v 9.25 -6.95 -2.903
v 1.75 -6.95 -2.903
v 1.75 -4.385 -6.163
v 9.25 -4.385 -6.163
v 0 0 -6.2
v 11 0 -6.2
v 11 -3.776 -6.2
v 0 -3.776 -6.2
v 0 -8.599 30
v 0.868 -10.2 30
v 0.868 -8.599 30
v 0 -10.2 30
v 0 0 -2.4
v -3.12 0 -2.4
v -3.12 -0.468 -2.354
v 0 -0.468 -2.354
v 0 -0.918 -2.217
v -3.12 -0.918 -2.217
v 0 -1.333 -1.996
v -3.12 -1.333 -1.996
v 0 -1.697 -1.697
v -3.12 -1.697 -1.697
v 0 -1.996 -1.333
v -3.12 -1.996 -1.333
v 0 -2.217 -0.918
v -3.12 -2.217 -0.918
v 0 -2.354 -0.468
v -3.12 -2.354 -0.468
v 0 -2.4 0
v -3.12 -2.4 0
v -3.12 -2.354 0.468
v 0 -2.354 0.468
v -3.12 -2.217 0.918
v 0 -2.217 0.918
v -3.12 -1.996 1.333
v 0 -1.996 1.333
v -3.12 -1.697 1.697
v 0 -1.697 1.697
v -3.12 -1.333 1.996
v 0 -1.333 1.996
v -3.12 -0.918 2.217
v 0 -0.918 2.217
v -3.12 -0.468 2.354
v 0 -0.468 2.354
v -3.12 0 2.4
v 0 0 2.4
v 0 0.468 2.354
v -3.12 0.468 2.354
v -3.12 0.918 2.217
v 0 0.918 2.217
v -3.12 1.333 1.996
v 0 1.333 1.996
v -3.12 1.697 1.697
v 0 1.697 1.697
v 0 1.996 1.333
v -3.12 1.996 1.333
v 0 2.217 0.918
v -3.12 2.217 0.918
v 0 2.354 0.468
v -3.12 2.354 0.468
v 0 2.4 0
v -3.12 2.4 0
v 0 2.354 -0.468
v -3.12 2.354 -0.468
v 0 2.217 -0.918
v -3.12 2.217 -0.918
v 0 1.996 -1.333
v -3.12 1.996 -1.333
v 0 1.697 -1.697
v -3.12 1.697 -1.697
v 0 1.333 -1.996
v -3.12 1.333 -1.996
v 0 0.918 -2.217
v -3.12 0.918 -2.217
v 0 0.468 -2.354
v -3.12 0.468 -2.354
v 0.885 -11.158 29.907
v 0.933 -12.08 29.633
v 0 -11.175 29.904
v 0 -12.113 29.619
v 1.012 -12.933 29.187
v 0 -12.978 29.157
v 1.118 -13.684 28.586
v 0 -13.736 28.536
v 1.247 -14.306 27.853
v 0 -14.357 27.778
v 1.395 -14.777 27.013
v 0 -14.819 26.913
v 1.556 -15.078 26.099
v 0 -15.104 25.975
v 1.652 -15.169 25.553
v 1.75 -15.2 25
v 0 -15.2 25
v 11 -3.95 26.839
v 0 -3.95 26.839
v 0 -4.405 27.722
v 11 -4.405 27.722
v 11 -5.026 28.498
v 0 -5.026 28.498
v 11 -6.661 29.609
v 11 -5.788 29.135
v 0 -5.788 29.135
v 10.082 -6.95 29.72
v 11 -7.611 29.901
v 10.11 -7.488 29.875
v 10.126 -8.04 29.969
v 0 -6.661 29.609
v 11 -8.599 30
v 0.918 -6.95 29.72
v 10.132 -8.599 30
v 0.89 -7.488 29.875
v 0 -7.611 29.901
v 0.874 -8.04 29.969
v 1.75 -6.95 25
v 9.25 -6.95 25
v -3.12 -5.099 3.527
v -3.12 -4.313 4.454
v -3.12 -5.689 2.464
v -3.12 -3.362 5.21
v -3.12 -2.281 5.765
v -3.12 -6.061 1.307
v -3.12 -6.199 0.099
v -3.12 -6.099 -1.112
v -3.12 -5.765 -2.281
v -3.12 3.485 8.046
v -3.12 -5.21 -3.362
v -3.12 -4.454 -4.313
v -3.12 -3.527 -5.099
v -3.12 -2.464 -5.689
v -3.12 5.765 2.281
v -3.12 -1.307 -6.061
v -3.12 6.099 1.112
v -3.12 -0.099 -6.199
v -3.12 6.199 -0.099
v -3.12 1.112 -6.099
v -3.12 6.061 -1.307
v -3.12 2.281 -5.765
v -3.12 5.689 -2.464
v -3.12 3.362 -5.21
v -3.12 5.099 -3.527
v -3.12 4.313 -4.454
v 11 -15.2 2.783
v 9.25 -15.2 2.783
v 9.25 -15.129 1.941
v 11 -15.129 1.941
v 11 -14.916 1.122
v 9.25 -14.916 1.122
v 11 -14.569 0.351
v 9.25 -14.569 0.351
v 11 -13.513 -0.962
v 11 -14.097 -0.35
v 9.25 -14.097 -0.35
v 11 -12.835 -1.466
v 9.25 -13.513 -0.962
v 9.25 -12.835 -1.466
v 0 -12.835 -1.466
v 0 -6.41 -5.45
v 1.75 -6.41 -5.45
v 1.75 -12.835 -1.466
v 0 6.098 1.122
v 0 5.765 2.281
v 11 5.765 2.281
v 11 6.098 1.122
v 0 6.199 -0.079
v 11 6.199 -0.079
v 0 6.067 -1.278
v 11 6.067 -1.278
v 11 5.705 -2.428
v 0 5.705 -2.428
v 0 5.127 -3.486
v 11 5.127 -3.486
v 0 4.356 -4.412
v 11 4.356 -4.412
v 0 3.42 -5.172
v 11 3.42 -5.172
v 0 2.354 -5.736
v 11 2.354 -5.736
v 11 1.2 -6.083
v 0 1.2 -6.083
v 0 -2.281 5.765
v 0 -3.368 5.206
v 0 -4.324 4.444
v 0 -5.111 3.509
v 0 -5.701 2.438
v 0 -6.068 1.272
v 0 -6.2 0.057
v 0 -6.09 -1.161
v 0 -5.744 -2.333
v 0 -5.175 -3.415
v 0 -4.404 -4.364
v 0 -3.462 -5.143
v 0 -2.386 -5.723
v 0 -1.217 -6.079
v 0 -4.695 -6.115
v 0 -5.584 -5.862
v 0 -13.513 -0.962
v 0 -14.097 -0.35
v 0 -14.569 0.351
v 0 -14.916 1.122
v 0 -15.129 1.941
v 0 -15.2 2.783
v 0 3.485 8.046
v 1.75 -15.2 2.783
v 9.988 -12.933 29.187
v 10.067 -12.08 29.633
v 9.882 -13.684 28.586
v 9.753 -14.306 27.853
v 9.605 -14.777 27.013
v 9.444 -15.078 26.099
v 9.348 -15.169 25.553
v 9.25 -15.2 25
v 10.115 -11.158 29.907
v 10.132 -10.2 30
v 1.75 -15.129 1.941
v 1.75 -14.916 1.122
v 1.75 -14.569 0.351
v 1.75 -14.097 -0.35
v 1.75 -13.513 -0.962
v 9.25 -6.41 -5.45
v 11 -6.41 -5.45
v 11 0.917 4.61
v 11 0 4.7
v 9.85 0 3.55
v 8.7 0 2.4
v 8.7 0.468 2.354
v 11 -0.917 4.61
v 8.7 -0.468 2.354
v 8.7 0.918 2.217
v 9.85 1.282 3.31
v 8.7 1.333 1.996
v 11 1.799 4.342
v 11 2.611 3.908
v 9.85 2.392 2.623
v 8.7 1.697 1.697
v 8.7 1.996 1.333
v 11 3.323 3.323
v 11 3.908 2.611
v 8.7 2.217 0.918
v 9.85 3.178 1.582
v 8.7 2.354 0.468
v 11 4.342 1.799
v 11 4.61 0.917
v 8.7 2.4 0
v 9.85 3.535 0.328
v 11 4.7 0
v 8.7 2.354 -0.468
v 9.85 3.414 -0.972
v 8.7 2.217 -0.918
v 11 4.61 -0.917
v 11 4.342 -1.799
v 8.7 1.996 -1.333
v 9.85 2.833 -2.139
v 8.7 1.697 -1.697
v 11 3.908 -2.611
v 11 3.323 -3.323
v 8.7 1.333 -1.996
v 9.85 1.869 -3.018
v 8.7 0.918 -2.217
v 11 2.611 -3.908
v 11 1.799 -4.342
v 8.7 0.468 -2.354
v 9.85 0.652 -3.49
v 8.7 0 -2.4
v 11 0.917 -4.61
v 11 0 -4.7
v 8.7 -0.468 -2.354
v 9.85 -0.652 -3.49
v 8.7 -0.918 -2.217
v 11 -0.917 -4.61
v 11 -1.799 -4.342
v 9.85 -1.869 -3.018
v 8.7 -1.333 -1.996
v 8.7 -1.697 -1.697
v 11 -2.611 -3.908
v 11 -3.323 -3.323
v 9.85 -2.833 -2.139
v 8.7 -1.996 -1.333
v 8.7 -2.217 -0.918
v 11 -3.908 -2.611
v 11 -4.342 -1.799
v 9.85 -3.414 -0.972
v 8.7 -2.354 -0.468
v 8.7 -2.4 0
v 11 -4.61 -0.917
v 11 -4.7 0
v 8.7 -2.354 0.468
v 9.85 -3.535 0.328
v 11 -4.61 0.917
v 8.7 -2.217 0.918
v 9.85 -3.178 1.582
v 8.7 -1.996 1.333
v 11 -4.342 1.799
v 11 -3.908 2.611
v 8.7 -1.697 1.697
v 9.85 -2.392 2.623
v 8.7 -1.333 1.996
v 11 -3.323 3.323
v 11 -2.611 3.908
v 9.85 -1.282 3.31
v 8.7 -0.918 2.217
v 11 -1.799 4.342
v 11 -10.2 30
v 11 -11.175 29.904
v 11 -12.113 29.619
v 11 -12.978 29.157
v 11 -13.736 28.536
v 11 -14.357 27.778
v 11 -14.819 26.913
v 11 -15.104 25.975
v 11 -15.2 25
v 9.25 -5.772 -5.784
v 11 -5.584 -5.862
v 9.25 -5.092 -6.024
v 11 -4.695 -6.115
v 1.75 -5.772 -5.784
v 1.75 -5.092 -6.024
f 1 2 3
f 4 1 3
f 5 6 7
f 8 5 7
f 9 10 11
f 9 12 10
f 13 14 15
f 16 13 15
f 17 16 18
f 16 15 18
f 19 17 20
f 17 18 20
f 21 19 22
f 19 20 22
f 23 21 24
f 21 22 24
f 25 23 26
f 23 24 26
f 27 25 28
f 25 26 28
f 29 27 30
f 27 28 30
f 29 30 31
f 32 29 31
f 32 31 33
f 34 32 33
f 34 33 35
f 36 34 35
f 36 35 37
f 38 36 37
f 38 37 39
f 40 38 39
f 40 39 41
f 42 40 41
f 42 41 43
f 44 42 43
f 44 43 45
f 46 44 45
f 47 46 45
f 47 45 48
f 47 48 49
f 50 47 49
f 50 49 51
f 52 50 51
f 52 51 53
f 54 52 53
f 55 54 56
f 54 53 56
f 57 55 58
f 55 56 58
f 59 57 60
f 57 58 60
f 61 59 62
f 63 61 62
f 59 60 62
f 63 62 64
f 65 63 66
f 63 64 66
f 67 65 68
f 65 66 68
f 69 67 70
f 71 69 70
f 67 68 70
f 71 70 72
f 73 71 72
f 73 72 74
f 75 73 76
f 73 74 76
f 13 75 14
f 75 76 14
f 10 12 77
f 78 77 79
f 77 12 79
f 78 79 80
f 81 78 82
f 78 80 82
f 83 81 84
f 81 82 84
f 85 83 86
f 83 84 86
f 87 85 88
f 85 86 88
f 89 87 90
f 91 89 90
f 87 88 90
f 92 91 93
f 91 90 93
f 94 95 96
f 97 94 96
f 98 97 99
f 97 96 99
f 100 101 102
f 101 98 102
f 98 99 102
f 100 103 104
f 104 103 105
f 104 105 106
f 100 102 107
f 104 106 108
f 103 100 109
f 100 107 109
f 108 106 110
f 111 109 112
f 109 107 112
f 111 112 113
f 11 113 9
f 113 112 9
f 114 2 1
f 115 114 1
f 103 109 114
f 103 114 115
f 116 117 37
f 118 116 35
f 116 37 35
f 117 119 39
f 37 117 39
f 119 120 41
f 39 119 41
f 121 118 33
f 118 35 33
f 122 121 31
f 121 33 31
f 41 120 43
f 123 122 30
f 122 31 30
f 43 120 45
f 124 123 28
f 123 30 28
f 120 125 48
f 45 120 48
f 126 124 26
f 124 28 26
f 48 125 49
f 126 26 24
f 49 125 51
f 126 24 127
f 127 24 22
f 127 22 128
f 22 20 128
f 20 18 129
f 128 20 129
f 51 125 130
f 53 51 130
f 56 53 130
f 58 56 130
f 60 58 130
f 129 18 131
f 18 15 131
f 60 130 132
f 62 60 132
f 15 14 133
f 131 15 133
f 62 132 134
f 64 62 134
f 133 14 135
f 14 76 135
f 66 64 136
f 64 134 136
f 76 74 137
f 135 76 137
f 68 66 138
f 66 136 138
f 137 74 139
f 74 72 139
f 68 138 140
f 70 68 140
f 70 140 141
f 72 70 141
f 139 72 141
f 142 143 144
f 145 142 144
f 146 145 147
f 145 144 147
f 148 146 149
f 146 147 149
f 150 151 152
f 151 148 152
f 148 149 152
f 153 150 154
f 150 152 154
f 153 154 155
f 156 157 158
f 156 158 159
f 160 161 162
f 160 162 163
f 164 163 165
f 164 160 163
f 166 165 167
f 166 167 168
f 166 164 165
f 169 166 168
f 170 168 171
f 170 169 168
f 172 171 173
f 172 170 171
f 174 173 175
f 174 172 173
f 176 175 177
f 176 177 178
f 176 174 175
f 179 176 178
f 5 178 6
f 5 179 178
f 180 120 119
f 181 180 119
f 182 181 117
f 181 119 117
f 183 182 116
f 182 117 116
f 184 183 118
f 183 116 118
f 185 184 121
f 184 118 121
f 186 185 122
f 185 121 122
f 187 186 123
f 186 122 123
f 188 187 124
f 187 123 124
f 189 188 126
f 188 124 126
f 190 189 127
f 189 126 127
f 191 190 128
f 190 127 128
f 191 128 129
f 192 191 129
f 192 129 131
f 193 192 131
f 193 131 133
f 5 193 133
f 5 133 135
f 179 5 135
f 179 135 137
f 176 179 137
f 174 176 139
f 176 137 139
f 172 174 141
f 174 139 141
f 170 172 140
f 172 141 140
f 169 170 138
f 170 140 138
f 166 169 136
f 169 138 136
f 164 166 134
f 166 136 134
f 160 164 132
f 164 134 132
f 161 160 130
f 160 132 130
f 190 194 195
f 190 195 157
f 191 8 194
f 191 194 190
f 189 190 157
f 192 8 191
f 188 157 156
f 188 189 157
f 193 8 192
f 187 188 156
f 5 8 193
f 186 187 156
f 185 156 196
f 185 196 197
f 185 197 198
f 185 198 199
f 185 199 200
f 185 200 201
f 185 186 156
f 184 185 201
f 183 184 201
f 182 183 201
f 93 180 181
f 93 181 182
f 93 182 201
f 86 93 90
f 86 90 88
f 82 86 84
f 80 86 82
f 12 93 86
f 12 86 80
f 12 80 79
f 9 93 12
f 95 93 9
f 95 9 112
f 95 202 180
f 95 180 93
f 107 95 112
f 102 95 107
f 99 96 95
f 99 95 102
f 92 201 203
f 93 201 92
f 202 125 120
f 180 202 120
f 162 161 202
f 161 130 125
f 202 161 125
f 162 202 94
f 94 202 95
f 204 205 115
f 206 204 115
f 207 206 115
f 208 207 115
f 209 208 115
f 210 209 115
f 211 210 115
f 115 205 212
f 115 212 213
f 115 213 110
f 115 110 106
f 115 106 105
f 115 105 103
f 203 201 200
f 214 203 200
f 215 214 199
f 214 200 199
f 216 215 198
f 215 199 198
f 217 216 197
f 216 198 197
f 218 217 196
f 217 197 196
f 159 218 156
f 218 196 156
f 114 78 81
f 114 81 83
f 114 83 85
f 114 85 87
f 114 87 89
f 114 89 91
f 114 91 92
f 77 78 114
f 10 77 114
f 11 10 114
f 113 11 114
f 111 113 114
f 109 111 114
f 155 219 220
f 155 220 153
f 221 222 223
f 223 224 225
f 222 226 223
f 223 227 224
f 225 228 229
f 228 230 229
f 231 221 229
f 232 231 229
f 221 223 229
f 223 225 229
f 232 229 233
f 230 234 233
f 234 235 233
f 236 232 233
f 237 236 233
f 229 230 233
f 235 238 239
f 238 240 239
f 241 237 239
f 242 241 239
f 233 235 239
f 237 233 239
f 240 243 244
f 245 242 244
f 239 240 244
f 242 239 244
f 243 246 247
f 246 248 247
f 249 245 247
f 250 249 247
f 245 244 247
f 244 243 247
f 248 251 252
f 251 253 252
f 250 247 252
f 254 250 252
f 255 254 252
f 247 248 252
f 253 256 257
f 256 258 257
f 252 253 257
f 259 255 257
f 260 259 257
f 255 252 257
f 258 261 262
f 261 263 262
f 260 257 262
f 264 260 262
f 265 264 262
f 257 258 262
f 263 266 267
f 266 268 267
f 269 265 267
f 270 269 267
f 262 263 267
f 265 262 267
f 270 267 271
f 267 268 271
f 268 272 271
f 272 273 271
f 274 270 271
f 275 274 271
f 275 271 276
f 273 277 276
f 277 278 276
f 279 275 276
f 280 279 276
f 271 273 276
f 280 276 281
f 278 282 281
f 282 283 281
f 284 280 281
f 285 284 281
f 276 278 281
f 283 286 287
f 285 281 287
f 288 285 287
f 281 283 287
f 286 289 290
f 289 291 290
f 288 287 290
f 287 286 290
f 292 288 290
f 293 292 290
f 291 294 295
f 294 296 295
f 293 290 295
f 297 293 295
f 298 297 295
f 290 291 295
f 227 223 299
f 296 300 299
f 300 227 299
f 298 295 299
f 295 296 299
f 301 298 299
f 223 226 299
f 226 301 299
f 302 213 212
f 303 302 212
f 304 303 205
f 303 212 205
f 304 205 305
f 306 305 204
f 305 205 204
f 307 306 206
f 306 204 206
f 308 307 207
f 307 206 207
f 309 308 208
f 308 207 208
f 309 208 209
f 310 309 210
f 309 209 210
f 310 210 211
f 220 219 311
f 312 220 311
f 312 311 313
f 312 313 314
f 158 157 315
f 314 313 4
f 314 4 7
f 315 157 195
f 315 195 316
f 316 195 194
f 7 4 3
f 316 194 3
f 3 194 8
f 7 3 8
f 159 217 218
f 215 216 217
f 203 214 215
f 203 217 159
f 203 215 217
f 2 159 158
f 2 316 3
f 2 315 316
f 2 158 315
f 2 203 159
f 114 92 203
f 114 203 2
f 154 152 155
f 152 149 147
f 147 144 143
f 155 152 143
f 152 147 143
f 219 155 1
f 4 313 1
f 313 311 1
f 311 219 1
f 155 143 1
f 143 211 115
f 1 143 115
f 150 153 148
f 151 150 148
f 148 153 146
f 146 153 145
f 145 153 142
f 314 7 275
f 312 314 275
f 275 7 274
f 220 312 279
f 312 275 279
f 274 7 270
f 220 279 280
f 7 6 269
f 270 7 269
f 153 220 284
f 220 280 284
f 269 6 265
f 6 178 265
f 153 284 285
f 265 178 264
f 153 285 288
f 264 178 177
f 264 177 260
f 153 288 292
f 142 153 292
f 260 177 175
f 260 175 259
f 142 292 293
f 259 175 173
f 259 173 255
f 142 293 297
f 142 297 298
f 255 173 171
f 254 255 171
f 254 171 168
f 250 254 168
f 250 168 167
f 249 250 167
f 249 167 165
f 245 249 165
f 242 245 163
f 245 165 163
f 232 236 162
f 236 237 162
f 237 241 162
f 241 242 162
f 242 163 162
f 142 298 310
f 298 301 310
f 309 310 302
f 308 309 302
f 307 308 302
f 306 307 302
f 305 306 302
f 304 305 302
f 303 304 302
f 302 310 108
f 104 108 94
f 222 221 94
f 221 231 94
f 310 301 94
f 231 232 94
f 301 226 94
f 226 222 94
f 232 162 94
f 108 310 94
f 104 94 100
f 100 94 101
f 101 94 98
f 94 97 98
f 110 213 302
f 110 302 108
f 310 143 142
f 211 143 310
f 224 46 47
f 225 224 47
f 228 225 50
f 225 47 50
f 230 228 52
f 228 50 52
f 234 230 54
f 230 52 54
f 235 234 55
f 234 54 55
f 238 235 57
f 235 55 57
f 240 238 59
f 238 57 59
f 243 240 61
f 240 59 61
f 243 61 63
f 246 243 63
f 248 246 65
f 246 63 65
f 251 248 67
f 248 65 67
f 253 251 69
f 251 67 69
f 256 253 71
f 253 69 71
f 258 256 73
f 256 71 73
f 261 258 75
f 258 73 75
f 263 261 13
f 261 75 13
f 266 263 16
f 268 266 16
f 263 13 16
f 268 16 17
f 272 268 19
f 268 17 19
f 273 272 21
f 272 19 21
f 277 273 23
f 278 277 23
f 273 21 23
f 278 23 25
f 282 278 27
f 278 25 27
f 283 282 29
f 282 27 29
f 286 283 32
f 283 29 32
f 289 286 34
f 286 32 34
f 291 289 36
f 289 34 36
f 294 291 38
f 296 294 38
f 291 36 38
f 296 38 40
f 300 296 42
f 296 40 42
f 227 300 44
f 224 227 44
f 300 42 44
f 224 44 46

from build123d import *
from OCP.BRepFilletAPI import BRepFilletAPI_MakeChamfer

# Parameters (mm, degrees)
SKETCH1_R                                       = 2.2
BOSS_EXTRUDE1_DEPTH                             = 11
CUT_EXTRUDE1_REACH                              = 42.774
SKETCH2_W                                       = 7.5
SKETCH2_H                                       = 8.25
CHAMFER3_SIZE                                   = 5
CHAMFER3_SIZE2                                  = 0.881634904
FILLET1_R                                       = 5
CHAMFER1_SIZE                                   = 2.212207332
CHAMFER1_SIZE_2                                 = 4
CSK_FOR_M4_FLAT_HEAD_MACHINE_SCREW1_D           = 4.8
CSK_FOR_M4_FLAT_HEAD_MACHINE_SCREW1_CSINK_D     = 9.4
CSK_FOR_M4_FLAT_HEAD_MACHINE_SCREW1_CSINK_ANGLE = 90
BOSS_EXTRUDE2_START                             = 3.12
SKETCH6_R                                       = 2.4
BOSS_EXTRUDE2_DEPTH                             = 3.12


with BuildPart() as part:
    # Sketch1 → Boss-Extrude1 (new body)
    with BuildSketch(Plane(origin=(0, 0, 0), x_dir=(0, 0, -1), z_dir=(1, 0, 0))):
        with BuildLine():
            Line((-30, -15.2), (-30, -5.2))
            Line((-30, -5.2), (-2.280651189, 5.765295322))
            ThreePointArc((-2.280651189, 5.765295322), (3.485682331, 5.12737932), (6.2, 0))
            Line((6.2, 0), (6.2, -5.2))
            Line((6.2, -5.2), (0, -15.2))
            Line((0, -15.2), (-30, -15.2))
        make_face()
        Circle(SKETCH1_R, mode=Mode.SUBTRACT)
    extrude(amount=BOSS_EXTRUDE1_DEPTH)

    # Cut-Extrude1: up to this plane
    cut_extrude1_end = Plane(origin=(11, -5.2, -6.2), z_dir=(0, 0.5269396688616753, 0.8499026917123795))
    # Sketch2 → Cut-Extrude1 (cut, up to the surface)
    with BuildSketch(Plane.XY.offset(30), mode=Mode.PRIVATE) as cut_extrude1_sk1:
        with Locations((5.5, -11.075)):
            Rectangle(SKETCH2_W, SKETCH2_H)
    cut_extrude1_tool1 = split(extrude(cut_extrude1_sk1.sketch, amount=-CUT_EXTRUDE1_REACH, mode=Mode.PRIVATE), bisect_by=cut_extrude1_end, keep=Keep.BOTH, mode=Mode.PRIVATE)
    add(cut_extrude1_tool1.solids().sort_by_distance((5.5, -11.075, 30))[0], mode=Mode.SUBTRACT)

    # Chamfer3: one chamfer whose edges measure the first distance from different faces: ONE call of the kernel's chamfer builder (chamfer() names one face for all edges)
    chamfer3_edges_1 = [part.edges().sort_by_distance(p)[0] for p in [
        (1.75, -11.075, 30),
    ]]
    chamfer3_side_1 = [part.faces().sort_by_distance(p)[0] for p in [
        (1.75, -10.966989173, 13.687766644),
    ]]
    chamfer3_edges_2 = [part.edges().sort_by_distance(p)[0] for p in [
        (9.25, -11.075, 30),
    ]]
    chamfer3_side_2 = [part.faces().sort_by_distance(p)[0] for p in [
        (9.25, -10.966989173, 13.687766644),
    ]]
    chamfer3 = BRepFilletAPI_MakeChamfer(part.part.solid().wrapped)
    for e in chamfer3_edges_1:
        chamfer3.Add(CHAMFER3_SIZE, CHAMFER3_SIZE2, e.wrapped, chamfer3_side_1[0].wrapped)  # the first distance lies on this face
    for e in chamfer3_edges_2:
        chamfer3.Add(CHAMFER3_SIZE, CHAMFER3_SIZE2, e.wrapped, chamfer3_side_2[0].wrapped)  # the first distance lies on this face
    add(Compound.cast(chamfer3.Shape()), mode=Mode.REPLACE)

    # Fillet1
    # the kernel refuses this fillet: 5 mm, written as the material it takes off along each edge
    with BuildSketch(Plane(origin=(-12.5, -15.2, 30), x_dir=(0, 1, 0), z_dir=(1, 0, 0)), Plane(origin=(-2.368365096, -15.2, 30), x_dir=(0, 1, 0), z_dir=(1, 0, 0))) as fillet1_piece_1:
        with BuildLine():
            CenterArc((FILLET1_R, -FILLET1_R), FILLET1_R, 90, 90)
            Line((0, -FILLET1_R), (0, 0))
            Line((0, 0), (FILLET1_R, 0))
        make_face()
    extrude(amount=25.868365096, mode=Mode.SUBTRACT)
    with BuildSketch(Plane(origin=(-3.560590452, -5.2, -6.2), x_dir=(0, -0.8499026917123794, 0.5269396688616755), z_dir=(1, 0, 0))) as fillet1_piece_2:
        with BuildLine():
            CenterArc((FILLET1_R * 0.28484723614, -FILLET1_R), FILLET1_R, 90, 31.798912824)
            Line((-FILLET1_R * 0.242092432722, -FILLET1_R * 0.150097308288), (0, 0))
            Line((0, 0), (FILLET1_R * 0.28484723614, 0))
        make_face()
    extrude(amount=18.121180903, mode=Mode.SUBTRACT)
    with BuildSketch(Plane(origin=(-6.95756608, -15.2, 0), x_dir=(0, 0.8499026917123792, -0.5269396688616758), z_dir=(1, 0, 0)), Plane(origin=(2.29243392, -15.2, 0), x_dir=(0, 0.8499026917123792, -0.5269396688616758), z_dir=(1, 0, 0))) as fillet1_piece_3:
        with BuildLine():
            CenterArc((FILLET1_R * 0.556605286407, FILLET1_R), FILLET1_R, 211.798912824, 58.201087176)
            Line((-FILLET1_R * 0.293297405306, FILLET1_R * 0.473060331138), (0, 0))
            Line((0, 0), (FILLET1_R * 0.556605286407, 0))
        make_face()
    extrude(amount=15.66513216, mode=Mode.SUBTRACT)
    with BuildSketch(Plane(origin=(-8.497719093, -5.2, 30), x_dir=(0, -1, 0), z_dir=(1, 0, 0))) as fillet1_piece_4:
        with BuildLine():
            CenterArc((FILLET1_R * 0.679817527413, FILLET1_R), FILLET1_R, 201.582895238, 68.417104762)
            Line((-FILLET1_R * 0.250068814892, FILLET1_R * 0.632153034001), (0, 0))
            Line((0, 0), (FILLET1_R * 0.679817527413, 0))
        make_face()
    extrude(amount=27.995438185, mode=Mode.SUBTRACT)

    # Chamfer1
    # the kernel refuses this chamfer: 4, 2.212207332 mm, written as the material it takes off along each edge
    with BuildSketch(Plane(origin=(1.75, -6.95, -5.115), x_dir=(0, -0.04228471314336273, 0.9991056015428917), z_dir=(1, 0, 0))) as chamfer1_piece_1:
        Polygon((CHAMFER1_SIZE * 0.999105601467, -CHAMFER1_SIZE * 0.0422847131402), (-CHAMFER1_SIZE_2 * 0.562406266354, -CHAMFER1_SIZE_2 * 0.826861047315), (0, 0), align=None)
    extrude(amount=7.5, mode=Mode.SUBTRACT)

    # CSK for M4 Flat Head Machine Screw1 (through all)
    with Locations(Plane(origin=(11, 0, 0), x_dir=(0, 0, -1), z_dir=(1, 0, 0))):
        with Locations((0, 0)):
            CounterSinkHole(CSK_FOR_M4_FLAT_HEAD_MACHINE_SCREW1_D / 2, CSK_FOR_M4_FLAT_HEAD_MACHINE_SCREW1_CSINK_D / 2, counter_sink_angle=CSK_FOR_M4_FLAT_HEAD_MACHINE_SCREW1_CSINK_ANGLE)

    # Sketch6 → Boss-Extrude2 (add)
    with BuildSketch(Plane.ZY.offset(BOSS_EXTRUDE2_START)):
        with BuildLine():
            Line((8.045946511, 3.484644133), (5.765295322, -2.280651189))
            ThreePointArc((5.765295322, -2.280651189), (-5.689343339, -2.464015497), (2.280651189, 5.765295322))
            Line((2.280651189, 5.765295322), (8.045946511, 3.484644133))
        make_face()
        with Locations(Location((0, 0, 0), (0, 0, 180))):
            Circle(SKETCH6_R, mode=Mode.SUBTRACT)
    extrude(amount=-BOSS_EXTRUDE2_DEPTH)


solid = part.part
